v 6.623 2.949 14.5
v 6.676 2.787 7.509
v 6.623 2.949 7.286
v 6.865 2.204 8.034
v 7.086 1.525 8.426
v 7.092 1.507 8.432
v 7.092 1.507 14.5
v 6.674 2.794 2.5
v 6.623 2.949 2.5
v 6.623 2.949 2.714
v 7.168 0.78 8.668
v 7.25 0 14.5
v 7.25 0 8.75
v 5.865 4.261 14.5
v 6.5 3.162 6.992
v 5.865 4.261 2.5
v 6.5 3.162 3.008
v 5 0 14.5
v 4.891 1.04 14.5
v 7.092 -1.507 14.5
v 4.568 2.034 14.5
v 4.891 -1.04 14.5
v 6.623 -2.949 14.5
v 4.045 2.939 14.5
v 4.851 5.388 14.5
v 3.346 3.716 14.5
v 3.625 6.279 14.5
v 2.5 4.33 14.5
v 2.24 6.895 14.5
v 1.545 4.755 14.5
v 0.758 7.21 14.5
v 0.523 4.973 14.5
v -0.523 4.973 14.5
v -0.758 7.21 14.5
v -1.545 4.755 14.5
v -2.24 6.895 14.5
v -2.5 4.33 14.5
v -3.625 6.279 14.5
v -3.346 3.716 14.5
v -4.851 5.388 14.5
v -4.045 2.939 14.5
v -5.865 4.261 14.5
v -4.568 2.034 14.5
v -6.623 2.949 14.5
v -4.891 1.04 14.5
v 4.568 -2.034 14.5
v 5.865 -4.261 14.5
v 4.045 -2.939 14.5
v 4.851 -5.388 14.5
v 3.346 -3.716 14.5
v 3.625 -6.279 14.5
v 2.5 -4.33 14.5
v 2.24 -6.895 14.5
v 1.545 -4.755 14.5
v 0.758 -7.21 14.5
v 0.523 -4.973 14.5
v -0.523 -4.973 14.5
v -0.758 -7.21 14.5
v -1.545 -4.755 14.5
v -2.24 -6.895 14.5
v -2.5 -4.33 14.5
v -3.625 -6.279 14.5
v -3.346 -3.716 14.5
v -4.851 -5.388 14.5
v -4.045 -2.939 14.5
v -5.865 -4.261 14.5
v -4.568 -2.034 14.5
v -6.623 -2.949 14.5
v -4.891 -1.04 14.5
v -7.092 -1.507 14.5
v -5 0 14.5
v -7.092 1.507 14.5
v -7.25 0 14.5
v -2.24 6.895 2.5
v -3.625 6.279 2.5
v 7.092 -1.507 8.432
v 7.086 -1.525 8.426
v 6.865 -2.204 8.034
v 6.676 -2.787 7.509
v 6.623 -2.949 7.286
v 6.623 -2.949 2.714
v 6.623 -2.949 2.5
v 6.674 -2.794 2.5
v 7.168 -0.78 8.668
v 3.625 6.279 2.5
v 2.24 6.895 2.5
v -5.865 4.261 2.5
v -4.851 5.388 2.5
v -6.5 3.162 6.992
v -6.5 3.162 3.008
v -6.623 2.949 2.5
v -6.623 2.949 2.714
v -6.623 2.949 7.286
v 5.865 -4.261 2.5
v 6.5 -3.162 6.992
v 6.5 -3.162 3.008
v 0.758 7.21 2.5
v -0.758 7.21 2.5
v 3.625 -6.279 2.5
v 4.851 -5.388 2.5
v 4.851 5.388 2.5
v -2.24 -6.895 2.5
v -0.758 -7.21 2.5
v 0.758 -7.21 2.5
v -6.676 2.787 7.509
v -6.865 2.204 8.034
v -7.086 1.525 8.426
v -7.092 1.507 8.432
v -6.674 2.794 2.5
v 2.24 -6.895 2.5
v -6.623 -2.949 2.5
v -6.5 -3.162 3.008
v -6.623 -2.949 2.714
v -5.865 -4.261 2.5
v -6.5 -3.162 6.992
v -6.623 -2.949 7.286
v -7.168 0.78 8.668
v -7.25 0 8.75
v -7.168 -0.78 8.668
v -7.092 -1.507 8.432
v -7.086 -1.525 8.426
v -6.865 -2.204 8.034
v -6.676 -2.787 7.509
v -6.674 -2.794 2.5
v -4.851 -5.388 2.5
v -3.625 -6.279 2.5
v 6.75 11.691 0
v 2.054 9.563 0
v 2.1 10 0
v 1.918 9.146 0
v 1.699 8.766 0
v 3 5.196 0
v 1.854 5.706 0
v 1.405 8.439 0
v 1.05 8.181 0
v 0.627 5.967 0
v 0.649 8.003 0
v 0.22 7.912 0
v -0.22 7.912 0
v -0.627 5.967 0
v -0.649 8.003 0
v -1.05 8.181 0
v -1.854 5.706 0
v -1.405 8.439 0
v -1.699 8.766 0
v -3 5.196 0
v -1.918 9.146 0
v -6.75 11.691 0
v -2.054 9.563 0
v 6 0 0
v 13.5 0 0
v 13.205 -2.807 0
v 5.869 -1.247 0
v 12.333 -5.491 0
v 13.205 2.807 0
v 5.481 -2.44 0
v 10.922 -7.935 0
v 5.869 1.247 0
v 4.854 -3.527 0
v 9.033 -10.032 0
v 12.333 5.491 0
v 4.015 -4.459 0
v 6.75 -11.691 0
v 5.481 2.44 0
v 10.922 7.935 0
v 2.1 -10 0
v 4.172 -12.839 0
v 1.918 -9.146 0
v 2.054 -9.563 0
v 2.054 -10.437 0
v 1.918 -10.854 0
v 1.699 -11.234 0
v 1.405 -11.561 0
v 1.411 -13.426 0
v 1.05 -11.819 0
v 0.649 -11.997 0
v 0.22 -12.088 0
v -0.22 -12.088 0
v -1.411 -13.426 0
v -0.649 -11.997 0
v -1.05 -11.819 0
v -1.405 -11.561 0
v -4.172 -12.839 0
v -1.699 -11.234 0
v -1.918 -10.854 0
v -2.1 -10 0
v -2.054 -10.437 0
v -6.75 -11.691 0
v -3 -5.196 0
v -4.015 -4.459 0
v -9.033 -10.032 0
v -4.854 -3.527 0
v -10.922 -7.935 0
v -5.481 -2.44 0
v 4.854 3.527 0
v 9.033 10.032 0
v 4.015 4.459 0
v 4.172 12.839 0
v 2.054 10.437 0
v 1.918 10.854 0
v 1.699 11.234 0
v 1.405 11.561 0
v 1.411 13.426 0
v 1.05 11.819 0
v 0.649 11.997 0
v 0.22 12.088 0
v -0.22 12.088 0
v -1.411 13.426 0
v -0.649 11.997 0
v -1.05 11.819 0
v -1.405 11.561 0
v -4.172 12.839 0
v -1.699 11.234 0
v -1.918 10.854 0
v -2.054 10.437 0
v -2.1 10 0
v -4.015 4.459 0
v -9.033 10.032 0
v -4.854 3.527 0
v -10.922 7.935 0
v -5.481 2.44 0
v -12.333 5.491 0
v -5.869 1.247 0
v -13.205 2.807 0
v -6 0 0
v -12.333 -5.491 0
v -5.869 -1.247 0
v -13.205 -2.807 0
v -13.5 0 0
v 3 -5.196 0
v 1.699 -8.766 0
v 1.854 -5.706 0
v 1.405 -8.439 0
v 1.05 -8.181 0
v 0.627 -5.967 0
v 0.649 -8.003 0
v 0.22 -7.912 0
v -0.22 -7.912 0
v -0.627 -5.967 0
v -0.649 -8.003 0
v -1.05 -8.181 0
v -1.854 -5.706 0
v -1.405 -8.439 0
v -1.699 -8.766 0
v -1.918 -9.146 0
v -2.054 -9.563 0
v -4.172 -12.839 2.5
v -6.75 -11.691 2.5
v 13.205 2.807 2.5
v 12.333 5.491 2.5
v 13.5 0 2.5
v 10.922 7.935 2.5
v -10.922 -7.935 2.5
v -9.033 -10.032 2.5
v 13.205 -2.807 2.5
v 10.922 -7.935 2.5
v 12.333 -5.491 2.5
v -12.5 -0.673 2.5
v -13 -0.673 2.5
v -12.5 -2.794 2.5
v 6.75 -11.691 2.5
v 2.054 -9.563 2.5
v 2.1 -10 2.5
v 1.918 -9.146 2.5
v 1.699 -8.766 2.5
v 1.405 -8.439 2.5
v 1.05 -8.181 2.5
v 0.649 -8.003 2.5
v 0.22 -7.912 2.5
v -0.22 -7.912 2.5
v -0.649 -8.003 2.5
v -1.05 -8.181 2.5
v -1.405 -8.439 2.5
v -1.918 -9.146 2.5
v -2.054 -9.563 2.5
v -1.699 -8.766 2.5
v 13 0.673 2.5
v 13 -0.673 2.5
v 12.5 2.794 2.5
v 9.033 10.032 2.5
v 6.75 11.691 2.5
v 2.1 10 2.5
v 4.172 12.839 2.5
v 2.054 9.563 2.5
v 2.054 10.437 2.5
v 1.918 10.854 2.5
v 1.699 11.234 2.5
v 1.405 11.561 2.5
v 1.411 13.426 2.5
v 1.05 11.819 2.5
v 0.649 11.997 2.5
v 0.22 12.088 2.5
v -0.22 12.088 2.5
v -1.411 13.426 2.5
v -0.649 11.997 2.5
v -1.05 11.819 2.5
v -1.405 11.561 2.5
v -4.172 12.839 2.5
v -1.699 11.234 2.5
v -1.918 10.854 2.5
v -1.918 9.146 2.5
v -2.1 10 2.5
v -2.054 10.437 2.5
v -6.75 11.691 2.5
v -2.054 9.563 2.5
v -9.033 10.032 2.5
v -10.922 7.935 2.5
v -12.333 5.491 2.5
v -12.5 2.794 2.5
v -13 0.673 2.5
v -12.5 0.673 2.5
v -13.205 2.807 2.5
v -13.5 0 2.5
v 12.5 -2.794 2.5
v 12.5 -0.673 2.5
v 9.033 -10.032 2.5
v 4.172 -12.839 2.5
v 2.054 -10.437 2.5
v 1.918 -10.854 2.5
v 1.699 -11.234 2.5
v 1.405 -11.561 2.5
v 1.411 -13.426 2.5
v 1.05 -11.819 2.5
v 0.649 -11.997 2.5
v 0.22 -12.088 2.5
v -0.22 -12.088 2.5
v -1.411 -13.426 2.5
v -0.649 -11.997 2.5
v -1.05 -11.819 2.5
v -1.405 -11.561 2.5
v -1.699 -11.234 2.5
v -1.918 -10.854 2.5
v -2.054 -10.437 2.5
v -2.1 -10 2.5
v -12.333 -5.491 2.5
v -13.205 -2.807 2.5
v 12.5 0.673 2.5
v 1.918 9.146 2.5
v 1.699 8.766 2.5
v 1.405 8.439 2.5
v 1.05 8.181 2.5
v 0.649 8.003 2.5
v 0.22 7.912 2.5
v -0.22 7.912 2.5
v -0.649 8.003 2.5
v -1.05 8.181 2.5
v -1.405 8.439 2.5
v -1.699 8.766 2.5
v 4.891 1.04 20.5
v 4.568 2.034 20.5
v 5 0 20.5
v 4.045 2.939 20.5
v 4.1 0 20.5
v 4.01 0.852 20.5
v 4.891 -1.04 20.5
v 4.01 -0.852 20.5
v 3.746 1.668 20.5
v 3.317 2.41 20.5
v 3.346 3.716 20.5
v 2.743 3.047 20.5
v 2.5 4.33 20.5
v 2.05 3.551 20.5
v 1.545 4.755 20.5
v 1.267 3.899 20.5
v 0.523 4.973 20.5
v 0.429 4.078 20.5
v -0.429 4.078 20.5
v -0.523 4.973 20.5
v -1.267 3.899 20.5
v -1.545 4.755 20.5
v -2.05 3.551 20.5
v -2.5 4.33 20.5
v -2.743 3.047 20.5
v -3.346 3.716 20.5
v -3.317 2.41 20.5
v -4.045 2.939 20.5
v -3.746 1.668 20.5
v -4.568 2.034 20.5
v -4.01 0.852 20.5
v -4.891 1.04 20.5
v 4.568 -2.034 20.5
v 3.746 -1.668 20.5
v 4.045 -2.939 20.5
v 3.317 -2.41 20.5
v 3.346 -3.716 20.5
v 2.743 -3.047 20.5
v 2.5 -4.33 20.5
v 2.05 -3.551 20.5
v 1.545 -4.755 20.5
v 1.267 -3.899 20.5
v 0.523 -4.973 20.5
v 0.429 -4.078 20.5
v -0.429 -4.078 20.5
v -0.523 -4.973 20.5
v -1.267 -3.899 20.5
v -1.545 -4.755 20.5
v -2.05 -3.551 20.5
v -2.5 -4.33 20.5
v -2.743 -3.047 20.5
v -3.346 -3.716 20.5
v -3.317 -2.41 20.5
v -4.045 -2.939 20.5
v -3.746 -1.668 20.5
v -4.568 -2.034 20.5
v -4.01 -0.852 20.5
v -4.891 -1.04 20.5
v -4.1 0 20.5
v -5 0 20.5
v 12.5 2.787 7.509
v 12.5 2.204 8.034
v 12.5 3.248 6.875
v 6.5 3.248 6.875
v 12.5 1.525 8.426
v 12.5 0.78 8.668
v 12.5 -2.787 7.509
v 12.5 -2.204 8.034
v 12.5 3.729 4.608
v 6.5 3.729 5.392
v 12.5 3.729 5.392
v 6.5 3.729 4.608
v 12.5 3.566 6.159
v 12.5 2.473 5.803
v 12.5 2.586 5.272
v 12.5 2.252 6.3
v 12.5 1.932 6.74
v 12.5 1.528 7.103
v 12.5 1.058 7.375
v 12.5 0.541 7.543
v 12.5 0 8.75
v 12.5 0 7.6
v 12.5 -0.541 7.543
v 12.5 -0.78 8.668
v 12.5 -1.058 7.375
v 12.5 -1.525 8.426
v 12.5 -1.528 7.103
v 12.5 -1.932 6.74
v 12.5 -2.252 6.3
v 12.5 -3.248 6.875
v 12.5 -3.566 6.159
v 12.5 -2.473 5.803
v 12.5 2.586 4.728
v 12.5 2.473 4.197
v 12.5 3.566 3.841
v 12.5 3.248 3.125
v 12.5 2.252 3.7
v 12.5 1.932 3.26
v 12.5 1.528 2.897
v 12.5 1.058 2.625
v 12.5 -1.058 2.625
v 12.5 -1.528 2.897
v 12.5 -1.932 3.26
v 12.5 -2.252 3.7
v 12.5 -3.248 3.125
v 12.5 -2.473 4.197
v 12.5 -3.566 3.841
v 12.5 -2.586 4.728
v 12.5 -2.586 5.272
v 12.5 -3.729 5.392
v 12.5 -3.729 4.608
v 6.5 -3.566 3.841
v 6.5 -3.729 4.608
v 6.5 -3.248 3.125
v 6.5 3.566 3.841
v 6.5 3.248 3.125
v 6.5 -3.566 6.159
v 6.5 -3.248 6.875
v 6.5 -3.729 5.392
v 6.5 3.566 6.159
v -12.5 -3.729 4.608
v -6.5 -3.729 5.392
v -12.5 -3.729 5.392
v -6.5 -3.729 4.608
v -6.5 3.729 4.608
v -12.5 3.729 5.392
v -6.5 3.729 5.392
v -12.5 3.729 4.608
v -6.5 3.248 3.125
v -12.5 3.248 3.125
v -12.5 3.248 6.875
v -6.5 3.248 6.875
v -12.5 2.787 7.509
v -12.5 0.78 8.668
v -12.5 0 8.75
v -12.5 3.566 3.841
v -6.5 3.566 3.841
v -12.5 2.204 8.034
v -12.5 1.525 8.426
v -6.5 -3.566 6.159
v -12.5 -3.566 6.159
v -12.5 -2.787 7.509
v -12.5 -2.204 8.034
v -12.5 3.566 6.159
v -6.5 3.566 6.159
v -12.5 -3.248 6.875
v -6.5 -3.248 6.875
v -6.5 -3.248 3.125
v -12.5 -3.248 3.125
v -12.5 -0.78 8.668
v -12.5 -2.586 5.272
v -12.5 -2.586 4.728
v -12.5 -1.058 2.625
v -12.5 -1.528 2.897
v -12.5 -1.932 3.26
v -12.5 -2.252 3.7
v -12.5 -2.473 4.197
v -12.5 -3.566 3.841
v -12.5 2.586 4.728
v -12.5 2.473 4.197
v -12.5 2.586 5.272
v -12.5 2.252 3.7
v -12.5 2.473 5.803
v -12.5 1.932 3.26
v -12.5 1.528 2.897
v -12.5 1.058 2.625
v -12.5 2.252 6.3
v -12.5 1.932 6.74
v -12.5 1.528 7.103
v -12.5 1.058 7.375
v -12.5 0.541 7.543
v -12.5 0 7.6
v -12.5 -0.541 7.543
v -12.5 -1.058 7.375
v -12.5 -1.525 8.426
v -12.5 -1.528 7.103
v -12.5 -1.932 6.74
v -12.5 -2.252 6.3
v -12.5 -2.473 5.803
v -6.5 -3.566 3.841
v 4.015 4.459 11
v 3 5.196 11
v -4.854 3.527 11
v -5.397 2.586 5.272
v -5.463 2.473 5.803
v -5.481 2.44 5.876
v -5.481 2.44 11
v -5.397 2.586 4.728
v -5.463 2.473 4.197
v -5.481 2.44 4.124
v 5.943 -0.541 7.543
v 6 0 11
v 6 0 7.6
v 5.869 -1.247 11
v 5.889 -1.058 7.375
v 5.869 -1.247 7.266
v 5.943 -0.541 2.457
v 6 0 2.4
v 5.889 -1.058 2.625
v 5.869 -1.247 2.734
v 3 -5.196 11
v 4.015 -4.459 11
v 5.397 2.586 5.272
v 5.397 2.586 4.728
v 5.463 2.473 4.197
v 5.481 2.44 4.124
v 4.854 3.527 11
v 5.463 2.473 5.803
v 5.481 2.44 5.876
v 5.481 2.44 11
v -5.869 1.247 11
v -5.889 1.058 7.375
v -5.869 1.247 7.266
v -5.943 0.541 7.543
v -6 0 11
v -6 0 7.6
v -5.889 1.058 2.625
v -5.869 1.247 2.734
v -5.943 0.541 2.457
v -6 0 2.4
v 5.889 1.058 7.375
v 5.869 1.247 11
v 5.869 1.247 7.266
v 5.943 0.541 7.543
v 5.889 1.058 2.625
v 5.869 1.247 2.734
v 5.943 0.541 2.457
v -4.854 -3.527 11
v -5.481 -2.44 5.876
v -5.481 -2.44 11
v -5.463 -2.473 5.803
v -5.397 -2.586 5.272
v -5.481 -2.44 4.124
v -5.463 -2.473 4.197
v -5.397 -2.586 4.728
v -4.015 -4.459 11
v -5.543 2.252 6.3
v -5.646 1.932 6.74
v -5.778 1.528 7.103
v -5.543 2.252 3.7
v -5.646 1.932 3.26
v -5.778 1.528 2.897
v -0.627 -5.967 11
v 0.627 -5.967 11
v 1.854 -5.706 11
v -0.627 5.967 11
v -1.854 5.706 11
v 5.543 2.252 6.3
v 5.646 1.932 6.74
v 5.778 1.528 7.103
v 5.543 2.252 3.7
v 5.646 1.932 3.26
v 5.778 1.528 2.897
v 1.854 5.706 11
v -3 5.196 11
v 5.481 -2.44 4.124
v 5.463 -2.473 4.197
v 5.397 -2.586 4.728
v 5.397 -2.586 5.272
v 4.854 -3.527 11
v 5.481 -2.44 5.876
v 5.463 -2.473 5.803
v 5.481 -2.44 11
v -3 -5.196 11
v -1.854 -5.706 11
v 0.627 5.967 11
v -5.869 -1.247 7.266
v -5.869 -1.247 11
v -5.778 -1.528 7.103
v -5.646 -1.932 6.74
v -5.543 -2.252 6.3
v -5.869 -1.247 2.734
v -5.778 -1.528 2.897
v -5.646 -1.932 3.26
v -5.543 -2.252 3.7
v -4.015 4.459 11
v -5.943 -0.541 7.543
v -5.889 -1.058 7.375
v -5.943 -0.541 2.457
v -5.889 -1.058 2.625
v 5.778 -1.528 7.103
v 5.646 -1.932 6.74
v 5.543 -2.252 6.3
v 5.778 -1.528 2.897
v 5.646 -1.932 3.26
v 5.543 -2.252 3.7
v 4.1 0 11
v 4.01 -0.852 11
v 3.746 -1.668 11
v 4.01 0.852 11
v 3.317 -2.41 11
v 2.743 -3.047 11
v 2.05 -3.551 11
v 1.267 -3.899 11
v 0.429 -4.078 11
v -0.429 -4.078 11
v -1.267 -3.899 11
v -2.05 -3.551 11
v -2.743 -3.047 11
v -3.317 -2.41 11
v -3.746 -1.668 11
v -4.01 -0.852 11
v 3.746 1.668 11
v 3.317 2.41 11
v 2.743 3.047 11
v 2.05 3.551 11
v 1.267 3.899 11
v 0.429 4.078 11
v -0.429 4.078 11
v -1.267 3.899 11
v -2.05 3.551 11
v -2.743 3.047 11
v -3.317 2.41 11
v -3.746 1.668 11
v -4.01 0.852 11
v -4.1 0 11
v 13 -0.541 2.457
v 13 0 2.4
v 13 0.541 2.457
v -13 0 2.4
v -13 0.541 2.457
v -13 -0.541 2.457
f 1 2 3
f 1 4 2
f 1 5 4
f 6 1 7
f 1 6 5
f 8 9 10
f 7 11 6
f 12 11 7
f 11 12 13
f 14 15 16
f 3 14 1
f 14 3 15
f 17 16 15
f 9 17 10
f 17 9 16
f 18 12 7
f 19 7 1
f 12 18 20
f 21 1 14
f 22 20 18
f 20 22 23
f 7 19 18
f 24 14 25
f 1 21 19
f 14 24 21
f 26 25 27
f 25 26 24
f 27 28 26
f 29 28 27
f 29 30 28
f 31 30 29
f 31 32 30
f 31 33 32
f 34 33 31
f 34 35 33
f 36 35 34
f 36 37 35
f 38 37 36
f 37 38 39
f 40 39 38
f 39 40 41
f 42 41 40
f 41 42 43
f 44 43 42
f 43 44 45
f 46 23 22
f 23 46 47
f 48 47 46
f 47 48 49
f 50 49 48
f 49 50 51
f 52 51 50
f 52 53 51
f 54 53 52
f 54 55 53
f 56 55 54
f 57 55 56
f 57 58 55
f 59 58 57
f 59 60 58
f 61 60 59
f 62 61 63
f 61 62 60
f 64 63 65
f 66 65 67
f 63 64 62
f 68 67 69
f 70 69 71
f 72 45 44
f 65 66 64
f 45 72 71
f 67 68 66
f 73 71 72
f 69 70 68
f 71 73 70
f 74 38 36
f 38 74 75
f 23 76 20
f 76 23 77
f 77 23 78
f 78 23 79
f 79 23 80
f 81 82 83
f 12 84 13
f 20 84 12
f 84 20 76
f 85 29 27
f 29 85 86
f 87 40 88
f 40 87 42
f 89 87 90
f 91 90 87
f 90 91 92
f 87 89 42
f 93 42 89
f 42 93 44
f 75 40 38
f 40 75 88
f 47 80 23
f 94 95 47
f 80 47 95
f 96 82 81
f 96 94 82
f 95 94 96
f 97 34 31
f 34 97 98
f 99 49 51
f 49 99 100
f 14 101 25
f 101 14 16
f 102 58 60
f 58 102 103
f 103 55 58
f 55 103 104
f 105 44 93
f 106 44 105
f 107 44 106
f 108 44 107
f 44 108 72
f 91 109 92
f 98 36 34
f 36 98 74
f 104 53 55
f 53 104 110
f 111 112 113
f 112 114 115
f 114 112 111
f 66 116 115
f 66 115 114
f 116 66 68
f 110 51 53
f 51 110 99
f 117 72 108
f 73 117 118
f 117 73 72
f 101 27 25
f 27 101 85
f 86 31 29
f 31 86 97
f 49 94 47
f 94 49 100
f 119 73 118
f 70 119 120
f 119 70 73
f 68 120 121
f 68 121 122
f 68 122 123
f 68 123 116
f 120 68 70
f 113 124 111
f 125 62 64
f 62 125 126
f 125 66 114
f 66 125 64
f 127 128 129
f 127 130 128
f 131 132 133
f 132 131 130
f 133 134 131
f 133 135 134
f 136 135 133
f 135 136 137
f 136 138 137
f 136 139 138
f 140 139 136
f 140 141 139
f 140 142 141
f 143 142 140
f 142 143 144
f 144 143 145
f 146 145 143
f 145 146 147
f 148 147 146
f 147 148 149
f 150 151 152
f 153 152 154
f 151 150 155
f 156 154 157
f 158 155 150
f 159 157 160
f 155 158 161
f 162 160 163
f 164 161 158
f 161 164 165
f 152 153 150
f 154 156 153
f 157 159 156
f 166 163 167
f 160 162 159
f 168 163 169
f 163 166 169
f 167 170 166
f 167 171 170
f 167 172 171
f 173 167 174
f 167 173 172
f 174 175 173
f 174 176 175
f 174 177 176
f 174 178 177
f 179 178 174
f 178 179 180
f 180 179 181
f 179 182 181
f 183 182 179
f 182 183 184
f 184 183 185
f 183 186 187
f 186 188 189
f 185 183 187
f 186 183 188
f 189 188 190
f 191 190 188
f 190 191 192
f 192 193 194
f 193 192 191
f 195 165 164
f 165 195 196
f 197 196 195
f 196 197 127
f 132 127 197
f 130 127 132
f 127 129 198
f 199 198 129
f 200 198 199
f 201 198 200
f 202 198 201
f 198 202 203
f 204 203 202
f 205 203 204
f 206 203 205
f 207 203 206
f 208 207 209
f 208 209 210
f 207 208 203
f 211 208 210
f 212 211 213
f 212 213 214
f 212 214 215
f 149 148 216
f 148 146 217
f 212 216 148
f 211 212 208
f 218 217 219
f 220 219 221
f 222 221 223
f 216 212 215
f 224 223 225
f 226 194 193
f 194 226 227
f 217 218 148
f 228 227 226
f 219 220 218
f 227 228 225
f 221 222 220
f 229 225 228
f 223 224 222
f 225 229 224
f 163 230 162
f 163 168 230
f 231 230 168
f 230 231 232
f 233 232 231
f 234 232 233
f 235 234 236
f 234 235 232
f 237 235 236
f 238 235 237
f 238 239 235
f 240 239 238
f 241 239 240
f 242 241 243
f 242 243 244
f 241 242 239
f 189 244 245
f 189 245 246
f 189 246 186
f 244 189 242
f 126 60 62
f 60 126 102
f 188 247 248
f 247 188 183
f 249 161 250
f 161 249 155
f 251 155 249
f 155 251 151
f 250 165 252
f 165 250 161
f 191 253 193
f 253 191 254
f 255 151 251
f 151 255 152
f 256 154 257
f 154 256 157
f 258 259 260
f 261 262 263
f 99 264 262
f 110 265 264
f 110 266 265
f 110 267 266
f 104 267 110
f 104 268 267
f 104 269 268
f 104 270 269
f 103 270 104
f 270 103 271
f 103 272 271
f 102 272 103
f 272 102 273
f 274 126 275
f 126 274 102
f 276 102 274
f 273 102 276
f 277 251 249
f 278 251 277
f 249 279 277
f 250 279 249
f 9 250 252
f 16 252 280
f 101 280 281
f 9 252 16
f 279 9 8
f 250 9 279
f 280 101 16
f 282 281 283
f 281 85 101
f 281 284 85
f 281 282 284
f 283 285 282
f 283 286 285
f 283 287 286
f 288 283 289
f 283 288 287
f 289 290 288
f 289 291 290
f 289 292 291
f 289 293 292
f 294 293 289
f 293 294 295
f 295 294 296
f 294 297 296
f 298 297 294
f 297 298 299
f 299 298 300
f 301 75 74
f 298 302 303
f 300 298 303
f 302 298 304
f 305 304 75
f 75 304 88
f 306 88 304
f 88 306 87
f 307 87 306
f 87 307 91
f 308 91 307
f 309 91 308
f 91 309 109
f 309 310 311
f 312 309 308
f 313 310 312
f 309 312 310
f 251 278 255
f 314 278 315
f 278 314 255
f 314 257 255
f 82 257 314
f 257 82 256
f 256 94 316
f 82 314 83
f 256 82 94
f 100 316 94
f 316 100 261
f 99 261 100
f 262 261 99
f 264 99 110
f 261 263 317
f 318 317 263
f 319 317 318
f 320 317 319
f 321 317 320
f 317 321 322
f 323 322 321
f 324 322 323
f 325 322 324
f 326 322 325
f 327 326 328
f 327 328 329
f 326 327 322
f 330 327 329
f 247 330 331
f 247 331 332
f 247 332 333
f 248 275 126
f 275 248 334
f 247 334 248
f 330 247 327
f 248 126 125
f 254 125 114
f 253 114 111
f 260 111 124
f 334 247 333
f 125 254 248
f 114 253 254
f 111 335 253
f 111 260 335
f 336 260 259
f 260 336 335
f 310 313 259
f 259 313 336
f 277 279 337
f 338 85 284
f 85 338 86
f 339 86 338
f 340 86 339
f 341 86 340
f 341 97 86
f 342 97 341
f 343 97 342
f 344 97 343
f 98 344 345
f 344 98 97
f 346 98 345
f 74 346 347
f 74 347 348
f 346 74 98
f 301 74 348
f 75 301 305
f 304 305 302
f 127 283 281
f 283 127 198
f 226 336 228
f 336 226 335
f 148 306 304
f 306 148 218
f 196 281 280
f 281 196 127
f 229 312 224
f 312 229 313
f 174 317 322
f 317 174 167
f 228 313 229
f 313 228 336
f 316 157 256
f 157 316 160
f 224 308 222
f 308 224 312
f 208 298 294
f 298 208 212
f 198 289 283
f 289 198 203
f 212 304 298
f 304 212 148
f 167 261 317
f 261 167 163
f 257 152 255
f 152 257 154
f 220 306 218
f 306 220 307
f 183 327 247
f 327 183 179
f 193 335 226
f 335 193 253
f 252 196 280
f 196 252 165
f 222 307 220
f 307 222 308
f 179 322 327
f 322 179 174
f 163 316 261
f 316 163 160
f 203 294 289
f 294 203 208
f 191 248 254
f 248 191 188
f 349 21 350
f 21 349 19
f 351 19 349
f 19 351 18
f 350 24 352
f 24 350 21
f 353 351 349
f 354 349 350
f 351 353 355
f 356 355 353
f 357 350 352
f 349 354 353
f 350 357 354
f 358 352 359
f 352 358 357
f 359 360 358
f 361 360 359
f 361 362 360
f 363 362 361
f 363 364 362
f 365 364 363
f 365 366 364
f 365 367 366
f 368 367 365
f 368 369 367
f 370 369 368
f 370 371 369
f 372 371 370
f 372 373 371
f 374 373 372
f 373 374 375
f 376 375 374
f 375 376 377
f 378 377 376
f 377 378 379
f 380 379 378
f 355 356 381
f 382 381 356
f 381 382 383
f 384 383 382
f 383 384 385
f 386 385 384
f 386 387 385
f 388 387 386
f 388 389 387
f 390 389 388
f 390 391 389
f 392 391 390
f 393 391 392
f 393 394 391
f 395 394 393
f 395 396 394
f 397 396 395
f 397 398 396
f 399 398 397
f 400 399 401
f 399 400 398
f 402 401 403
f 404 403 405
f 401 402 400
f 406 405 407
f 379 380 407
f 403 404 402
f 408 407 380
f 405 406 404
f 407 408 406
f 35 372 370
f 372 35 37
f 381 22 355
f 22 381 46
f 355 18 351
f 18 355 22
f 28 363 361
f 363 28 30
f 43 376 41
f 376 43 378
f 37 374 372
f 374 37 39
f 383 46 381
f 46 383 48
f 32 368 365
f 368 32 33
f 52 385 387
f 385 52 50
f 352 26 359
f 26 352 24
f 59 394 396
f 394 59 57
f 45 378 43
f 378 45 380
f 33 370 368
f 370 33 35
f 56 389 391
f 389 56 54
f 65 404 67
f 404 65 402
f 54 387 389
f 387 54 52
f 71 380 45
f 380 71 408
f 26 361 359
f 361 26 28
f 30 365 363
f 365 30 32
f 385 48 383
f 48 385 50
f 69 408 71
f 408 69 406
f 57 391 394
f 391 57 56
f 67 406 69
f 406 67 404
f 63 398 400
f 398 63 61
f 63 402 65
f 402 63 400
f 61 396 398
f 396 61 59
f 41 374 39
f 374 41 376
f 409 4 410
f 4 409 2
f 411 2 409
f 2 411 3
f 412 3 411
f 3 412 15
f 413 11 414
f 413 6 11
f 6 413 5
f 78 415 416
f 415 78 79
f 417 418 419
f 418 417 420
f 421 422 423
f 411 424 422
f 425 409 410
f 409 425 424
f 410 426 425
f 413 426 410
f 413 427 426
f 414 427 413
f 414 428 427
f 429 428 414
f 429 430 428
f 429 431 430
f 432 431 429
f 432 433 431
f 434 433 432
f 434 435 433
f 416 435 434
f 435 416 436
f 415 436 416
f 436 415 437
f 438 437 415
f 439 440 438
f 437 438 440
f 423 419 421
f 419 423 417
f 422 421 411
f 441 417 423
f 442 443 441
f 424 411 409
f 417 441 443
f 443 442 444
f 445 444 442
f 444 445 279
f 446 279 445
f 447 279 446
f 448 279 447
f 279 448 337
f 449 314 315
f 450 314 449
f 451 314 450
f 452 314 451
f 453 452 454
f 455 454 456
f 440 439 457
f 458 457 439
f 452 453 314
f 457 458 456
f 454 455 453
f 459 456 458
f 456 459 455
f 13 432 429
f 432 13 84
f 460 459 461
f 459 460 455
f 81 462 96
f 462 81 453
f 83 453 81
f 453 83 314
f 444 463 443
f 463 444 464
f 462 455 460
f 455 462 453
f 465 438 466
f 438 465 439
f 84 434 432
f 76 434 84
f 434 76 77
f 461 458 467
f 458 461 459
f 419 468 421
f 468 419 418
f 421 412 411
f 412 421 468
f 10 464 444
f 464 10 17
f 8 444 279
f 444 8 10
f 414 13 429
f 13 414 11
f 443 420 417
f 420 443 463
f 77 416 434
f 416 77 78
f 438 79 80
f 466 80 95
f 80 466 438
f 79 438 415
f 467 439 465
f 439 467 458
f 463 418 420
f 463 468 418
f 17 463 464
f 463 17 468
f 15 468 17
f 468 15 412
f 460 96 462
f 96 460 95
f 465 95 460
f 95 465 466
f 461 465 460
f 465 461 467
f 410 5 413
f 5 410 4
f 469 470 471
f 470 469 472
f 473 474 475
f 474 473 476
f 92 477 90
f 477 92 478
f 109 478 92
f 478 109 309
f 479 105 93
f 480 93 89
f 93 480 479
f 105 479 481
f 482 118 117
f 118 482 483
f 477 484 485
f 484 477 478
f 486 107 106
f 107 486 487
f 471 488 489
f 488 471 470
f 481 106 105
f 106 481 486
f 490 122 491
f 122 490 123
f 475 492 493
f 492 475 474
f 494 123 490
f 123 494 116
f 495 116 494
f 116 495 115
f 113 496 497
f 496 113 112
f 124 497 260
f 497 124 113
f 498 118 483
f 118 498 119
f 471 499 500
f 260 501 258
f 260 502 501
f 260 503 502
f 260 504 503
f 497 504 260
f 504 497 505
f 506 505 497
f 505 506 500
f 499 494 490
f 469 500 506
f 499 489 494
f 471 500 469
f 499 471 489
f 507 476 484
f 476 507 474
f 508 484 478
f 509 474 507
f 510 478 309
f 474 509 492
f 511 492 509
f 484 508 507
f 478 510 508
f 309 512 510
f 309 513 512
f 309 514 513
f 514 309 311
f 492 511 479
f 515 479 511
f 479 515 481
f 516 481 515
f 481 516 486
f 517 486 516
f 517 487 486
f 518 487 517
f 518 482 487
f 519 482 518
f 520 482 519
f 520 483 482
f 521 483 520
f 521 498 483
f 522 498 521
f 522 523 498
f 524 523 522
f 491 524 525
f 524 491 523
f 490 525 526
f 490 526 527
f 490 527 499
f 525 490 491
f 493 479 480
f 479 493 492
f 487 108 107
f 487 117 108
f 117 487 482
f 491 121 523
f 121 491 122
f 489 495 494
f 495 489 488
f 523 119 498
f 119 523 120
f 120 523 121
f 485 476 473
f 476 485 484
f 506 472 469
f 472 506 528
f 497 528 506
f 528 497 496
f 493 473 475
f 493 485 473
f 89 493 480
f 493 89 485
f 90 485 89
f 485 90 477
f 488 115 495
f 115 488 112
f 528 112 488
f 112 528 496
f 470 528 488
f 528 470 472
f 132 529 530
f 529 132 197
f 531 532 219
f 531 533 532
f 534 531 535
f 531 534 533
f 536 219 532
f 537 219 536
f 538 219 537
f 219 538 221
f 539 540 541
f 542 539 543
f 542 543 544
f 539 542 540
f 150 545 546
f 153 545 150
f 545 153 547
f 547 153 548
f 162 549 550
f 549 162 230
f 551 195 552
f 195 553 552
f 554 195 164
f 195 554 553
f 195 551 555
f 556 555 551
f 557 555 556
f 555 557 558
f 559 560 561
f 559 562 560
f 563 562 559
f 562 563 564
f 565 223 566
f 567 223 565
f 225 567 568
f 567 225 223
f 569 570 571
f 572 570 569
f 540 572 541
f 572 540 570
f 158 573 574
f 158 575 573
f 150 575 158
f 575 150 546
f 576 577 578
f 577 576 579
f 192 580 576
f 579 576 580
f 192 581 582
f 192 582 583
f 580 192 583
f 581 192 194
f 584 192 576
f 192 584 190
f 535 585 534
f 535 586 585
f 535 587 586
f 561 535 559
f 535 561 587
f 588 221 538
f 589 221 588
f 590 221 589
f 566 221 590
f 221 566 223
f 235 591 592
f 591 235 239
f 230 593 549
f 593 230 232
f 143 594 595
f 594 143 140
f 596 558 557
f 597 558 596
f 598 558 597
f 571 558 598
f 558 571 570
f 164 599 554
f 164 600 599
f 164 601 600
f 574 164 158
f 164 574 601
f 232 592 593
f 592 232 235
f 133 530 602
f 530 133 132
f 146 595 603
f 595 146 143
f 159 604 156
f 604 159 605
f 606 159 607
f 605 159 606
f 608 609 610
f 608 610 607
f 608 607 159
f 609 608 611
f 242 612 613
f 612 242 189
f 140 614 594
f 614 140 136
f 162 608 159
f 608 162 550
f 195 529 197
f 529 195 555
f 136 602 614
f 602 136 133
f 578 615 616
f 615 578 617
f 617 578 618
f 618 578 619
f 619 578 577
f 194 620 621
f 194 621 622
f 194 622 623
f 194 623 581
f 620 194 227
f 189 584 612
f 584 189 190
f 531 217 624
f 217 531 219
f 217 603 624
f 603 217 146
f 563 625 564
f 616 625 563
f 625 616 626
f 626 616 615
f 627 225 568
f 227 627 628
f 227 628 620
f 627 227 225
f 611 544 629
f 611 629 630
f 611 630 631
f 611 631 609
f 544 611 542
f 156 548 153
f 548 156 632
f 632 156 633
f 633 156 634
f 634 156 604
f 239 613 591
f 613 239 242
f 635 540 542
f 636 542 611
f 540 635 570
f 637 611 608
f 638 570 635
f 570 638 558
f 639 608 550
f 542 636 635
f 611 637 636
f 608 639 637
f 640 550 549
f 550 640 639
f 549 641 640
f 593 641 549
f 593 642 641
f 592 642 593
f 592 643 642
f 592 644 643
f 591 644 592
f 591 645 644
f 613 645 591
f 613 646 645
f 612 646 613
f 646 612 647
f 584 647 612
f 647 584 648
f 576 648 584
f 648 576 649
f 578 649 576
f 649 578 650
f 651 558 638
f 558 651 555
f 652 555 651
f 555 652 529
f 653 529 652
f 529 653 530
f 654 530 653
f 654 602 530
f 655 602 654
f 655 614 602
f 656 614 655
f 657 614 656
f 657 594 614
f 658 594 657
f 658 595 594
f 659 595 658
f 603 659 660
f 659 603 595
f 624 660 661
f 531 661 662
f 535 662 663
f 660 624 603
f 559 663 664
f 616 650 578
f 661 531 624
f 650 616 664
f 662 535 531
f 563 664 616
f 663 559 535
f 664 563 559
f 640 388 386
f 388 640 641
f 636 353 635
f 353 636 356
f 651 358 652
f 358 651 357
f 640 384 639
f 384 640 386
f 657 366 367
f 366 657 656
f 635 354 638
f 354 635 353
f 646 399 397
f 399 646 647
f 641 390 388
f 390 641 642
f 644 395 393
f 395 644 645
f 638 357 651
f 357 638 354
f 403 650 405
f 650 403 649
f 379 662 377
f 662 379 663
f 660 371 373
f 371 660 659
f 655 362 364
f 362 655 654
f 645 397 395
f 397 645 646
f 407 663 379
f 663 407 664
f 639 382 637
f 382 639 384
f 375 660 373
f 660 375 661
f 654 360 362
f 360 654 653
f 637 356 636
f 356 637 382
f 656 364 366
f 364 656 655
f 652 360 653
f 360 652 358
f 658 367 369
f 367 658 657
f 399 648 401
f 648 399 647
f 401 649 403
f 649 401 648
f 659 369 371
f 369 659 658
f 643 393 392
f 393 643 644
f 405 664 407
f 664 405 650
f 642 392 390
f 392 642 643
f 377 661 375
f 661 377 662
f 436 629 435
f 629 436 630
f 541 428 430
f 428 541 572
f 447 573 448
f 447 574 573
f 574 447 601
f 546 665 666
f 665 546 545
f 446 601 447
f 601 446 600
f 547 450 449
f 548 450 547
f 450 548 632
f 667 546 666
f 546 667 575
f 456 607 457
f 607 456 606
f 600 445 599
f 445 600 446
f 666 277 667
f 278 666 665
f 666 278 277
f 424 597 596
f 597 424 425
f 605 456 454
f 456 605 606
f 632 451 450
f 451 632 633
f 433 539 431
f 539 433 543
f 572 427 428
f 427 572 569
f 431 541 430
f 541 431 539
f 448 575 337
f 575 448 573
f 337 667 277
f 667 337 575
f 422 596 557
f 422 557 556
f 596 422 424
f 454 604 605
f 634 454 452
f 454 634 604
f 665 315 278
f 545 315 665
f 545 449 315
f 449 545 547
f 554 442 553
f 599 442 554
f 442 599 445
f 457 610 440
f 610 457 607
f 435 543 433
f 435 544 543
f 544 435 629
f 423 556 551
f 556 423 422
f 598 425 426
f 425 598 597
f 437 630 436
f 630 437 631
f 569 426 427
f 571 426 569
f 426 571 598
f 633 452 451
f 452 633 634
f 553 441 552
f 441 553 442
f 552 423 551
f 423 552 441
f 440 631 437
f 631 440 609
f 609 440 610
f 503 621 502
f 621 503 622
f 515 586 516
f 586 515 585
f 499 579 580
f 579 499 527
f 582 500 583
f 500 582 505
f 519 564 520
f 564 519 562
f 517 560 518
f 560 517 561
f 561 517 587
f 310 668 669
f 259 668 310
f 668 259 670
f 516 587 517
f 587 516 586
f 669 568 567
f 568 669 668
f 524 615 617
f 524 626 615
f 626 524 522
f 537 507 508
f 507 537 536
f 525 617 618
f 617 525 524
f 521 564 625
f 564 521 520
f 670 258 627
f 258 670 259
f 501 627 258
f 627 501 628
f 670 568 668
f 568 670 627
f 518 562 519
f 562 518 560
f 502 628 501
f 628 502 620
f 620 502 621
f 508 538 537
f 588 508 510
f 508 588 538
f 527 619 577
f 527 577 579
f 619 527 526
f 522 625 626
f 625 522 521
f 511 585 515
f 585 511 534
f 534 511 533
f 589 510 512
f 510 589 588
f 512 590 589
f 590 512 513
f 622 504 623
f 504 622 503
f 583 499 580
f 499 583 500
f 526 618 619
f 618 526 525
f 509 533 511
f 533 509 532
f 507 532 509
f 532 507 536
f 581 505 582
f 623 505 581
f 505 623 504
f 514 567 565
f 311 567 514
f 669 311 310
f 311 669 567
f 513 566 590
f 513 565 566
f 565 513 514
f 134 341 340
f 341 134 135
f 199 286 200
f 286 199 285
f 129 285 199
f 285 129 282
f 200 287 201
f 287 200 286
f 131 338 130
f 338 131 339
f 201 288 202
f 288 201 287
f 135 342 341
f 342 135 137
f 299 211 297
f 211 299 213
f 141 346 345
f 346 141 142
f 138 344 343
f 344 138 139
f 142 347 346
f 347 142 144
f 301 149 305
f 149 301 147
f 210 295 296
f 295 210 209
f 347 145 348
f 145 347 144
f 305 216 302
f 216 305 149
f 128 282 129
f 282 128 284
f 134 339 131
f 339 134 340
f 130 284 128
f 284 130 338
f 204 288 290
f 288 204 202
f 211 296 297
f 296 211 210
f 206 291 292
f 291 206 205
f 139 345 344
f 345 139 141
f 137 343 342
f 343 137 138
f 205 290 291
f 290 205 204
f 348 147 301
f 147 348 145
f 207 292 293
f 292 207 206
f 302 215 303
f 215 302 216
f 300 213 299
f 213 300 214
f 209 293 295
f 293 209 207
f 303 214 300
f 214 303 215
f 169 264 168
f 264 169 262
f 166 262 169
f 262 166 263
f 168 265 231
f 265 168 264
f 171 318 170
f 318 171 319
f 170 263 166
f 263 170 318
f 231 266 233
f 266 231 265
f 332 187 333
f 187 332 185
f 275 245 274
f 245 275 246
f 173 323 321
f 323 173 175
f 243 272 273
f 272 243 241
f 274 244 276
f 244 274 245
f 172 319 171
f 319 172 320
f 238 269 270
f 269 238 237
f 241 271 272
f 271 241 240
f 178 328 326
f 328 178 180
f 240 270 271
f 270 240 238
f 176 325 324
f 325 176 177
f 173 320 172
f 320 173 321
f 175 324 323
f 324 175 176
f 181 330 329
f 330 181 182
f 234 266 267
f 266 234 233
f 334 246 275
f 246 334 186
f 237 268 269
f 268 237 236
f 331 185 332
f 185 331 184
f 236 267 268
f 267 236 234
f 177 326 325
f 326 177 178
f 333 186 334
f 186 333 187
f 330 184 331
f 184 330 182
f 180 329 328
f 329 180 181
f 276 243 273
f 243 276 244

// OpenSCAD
screwD = 4;

noseHoleD = 12;
noseHoleH = 12;
tolerance = 0.1;

ledDx = 8; // main LED
ledD = 5;
ledH = 6;
wallT = 2.5;

module nosePoke(){
    $fn=30;
difference(){
union(){
cylinder(d=noseHoleD+wallT,h=noseHoleH+wallT);
cylinder(d=noseHoleD+2*screwD+7,h=wallT);
translate([0,0,noseHoleH+wallT]){
cylinder(d=ledDx+2,h=ledH);
}//end translate

translate([(noseHoleD+1)/2,0,ledD]){
rotate([0,90,0]){
    cylinder(d=ledD+wallT,h=ledH);
}//end rotate
}//end translate

translate([-(noseHoleD+1)/2,0,ledD]){
rotate([0,-90,0]){
    cylinder(d=ledD+wallT,h=ledH);
}//end rotate
}//end translate
}//end union


translate([0,0,-1]){
cylinder(d=noseHoleD,h=noseHoleH);
cylinder(d=ledDx+2*tolerance,h=ledH+noseHoleH+wallT+5);
}//end translate

translate([(noseHoleD+1)/2-wallT,0,ledD]){
rotate([0,90,0]){
    cylinder(d=ledD+2*tolerance,h=ledH+3);
}//end rotate
}//end translate

translate([-(noseHoleD+1)/2+wallT,0,ledD]){
rotate([0,-90,0]){
    cylinder(d=ledD+2*tolerance,h=ledH+3);
}//end rotate
}//end translate

translate([0,(noseHoleD)/2+screwD,-1]){
cylinder(d=screwD+2*tolerance,h=10);
}//end translate

translate([0,-(noseHoleD)/2-screwD,-1]){
cylinder(d=screwD+2*tolerance,h=10);
}//end translate
}//end difference
}//end module




  
nosePoke();
 
